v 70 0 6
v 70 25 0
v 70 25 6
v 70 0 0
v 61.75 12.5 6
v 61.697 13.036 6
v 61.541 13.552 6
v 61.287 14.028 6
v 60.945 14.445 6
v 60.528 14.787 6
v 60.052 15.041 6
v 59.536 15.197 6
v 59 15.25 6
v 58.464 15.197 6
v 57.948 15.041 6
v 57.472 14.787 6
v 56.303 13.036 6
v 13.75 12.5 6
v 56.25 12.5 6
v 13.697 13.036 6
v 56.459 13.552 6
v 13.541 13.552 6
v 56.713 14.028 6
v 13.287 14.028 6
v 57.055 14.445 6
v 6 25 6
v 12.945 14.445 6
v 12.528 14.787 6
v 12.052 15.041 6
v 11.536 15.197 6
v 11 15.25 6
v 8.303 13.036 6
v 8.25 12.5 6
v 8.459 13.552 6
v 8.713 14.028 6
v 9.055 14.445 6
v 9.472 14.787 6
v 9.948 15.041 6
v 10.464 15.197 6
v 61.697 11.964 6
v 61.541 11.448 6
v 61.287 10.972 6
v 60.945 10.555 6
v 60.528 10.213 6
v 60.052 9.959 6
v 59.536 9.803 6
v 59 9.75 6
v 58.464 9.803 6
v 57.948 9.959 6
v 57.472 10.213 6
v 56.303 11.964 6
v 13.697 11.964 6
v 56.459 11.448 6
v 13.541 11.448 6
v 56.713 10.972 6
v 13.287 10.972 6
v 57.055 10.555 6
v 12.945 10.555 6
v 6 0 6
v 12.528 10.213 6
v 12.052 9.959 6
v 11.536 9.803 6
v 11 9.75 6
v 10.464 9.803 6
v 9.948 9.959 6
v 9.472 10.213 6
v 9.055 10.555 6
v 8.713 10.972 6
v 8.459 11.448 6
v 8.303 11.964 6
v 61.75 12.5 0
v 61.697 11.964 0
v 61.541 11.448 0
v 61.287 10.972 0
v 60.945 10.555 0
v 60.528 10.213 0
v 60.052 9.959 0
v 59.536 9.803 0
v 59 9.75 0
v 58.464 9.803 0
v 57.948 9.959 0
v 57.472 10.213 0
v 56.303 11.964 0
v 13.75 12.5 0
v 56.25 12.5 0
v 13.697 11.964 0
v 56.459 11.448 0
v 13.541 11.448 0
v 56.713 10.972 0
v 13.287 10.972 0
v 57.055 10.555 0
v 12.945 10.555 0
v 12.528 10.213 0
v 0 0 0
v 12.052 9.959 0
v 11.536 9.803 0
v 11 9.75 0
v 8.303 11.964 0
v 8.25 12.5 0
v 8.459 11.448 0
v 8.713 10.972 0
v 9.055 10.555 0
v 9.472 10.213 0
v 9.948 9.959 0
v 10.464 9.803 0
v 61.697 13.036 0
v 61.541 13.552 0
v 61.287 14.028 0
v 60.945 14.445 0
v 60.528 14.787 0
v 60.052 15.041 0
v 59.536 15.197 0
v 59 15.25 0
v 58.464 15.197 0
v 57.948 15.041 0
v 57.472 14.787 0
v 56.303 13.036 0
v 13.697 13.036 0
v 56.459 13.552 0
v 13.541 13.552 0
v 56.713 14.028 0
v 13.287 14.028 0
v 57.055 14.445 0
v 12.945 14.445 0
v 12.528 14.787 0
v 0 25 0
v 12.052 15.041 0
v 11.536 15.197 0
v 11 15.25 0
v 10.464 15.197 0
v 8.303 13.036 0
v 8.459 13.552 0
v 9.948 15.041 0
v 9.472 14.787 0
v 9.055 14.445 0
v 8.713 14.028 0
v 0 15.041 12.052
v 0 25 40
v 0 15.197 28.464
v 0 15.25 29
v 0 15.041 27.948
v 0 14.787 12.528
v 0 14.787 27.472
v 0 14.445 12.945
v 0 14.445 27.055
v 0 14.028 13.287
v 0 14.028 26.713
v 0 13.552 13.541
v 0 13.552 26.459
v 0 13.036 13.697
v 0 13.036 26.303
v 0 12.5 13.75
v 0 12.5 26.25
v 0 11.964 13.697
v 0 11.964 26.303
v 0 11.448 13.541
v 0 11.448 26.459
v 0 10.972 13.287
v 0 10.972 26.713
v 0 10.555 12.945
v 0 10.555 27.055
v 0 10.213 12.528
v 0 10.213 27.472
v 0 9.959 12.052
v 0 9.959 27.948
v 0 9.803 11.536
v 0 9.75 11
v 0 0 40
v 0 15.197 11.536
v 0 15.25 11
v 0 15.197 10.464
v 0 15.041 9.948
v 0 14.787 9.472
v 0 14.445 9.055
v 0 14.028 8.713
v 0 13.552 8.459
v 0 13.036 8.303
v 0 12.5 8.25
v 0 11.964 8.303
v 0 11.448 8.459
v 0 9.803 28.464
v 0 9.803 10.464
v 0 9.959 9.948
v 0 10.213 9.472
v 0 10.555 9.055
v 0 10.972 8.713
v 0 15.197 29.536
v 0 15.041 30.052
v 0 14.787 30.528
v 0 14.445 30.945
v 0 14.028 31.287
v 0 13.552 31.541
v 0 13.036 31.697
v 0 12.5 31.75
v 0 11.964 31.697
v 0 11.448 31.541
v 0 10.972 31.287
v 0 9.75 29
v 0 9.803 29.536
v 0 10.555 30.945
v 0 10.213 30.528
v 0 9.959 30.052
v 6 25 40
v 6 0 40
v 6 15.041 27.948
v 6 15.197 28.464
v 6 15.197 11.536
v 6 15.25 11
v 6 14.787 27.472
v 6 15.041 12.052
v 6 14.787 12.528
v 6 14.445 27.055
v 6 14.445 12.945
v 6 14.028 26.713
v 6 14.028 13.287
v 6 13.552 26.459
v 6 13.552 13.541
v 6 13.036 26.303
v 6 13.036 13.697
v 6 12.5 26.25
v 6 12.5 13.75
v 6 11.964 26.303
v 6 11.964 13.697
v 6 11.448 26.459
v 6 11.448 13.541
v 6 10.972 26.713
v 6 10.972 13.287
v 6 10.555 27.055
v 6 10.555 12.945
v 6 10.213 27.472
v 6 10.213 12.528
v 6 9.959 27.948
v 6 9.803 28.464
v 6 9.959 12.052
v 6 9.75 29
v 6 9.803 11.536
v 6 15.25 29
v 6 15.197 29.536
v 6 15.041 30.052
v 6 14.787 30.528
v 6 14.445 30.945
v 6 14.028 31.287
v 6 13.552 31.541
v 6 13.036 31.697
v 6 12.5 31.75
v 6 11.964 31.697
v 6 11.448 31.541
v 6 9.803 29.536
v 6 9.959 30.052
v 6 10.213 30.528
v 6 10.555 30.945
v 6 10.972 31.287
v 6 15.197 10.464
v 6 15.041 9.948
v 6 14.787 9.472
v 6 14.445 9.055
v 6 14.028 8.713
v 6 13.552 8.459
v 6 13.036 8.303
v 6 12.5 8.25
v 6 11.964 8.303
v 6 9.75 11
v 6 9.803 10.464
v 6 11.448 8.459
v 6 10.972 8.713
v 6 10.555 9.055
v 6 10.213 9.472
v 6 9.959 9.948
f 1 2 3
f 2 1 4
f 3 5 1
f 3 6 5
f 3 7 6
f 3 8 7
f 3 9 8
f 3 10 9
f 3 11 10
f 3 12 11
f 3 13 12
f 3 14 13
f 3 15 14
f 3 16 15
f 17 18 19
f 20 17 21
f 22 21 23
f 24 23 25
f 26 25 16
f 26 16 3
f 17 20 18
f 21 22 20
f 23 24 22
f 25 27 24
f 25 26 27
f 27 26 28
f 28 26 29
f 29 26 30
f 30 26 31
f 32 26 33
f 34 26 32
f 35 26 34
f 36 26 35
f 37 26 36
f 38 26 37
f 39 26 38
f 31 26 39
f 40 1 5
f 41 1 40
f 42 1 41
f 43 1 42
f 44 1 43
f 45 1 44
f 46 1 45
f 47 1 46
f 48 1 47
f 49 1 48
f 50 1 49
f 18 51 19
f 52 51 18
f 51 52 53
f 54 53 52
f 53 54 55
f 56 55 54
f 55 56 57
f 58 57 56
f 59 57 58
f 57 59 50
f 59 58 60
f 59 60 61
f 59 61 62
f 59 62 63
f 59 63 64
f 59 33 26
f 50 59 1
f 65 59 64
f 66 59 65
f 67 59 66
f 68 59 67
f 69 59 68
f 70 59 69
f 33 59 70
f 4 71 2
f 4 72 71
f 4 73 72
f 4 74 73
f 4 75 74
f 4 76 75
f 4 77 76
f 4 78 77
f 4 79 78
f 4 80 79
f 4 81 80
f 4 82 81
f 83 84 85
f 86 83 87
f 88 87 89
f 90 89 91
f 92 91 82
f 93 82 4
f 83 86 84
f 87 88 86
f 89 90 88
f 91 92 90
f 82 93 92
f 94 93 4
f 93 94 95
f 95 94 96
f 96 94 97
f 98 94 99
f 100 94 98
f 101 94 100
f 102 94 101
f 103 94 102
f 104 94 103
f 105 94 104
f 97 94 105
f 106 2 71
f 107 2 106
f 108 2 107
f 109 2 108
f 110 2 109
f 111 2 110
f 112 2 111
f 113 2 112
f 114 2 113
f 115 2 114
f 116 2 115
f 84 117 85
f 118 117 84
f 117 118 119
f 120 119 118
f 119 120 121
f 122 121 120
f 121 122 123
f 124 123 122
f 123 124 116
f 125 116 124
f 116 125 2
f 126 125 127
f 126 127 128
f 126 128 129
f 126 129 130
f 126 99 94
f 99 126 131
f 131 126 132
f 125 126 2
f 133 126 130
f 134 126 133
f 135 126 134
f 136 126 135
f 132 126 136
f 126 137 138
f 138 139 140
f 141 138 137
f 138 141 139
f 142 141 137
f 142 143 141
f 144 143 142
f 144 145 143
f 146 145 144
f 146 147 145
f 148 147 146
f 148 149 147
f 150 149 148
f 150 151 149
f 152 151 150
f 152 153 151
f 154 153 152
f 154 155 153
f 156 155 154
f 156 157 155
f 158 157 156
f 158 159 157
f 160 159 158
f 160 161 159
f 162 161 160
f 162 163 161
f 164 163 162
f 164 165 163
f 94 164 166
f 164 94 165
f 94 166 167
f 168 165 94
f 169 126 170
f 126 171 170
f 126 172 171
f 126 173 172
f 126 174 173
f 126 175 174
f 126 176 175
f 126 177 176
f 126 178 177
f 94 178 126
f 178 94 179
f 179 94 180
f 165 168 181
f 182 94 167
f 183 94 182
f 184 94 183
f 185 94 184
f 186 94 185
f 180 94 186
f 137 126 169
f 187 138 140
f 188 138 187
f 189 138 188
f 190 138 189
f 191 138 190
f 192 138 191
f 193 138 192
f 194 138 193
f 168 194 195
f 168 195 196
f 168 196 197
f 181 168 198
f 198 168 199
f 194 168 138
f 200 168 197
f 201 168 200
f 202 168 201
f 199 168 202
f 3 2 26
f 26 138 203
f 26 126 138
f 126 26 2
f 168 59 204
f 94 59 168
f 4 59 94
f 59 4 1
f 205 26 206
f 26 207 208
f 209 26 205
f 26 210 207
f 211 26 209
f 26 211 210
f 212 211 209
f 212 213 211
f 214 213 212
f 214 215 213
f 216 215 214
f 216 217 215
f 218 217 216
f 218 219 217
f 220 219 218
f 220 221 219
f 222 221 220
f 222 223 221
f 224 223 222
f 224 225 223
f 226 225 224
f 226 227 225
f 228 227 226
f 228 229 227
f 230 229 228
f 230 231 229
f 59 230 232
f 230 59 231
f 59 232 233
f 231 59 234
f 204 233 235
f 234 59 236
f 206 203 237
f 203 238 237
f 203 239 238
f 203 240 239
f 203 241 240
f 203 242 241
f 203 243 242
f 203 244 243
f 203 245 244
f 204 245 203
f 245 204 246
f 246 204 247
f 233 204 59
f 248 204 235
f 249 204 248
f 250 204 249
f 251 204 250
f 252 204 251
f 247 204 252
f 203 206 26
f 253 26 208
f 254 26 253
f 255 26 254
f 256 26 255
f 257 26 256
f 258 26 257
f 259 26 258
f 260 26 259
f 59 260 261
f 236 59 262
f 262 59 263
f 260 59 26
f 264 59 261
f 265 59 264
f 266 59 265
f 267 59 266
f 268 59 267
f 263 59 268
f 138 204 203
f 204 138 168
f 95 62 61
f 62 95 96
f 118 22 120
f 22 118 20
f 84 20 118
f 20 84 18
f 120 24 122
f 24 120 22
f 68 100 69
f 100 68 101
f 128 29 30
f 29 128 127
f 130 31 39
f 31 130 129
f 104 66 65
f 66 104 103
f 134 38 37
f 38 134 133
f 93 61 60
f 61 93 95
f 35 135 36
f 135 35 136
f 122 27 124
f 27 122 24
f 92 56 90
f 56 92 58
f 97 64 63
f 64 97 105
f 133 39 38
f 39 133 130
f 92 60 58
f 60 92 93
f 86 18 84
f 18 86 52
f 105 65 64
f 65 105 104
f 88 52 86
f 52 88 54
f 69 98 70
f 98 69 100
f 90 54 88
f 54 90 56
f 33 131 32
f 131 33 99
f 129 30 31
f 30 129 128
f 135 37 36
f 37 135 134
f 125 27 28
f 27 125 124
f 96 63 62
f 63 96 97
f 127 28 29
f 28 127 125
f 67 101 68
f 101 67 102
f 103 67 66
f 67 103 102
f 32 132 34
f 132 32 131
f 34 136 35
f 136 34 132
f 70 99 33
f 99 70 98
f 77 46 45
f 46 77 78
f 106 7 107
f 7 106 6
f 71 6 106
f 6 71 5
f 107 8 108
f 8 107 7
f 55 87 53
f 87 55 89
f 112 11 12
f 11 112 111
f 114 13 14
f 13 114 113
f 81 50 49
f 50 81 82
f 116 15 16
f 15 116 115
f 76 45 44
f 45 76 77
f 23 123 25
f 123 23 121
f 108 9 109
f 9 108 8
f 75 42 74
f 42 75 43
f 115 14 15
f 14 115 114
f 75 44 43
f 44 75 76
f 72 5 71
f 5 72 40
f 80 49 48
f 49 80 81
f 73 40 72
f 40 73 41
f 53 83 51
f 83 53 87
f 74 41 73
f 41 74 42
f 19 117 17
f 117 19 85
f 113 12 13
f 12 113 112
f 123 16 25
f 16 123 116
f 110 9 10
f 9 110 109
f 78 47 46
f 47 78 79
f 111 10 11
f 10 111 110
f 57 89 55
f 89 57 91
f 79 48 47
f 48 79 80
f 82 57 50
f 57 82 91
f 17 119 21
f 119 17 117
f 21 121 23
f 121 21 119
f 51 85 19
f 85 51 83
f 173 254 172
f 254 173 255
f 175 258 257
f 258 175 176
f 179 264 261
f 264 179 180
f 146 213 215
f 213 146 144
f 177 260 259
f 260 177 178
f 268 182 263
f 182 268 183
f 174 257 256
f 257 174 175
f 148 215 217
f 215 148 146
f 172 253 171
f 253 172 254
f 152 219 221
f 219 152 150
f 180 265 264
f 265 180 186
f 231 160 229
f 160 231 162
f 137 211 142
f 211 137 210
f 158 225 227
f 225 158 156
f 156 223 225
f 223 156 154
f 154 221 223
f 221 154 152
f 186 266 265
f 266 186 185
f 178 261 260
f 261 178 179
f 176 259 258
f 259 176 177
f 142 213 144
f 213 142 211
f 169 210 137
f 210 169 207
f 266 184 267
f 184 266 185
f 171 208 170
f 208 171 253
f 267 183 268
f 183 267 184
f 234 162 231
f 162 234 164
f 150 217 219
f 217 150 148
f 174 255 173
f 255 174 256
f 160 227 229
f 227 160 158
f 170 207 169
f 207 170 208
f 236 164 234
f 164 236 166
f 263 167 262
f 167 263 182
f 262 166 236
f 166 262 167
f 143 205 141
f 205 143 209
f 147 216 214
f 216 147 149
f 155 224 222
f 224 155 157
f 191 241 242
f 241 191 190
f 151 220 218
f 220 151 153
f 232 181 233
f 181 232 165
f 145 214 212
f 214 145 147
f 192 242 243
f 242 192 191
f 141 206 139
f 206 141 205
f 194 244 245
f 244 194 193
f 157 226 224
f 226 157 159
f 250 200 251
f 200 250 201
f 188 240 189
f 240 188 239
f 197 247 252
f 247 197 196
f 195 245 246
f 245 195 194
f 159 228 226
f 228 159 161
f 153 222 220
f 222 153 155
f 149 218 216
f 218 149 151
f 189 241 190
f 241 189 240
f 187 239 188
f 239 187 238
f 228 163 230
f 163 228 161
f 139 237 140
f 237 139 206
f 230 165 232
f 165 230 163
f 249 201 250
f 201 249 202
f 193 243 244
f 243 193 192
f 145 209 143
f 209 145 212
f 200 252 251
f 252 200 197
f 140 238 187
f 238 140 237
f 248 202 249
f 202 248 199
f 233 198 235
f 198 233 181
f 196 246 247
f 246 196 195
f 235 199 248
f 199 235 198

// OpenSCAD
$fn = 32;

// ----------------------------------------------------------------------
// L-bracket: 70 x 25 x 40 mm
// ----------------------------------------------------------------------

// --- parameters (mm) ---
leg_a = 70;               // horizontal leg, X
leg_b = 40;               // vertical leg, Z
depth = 25;               // bracket depth, Y
thick = 6;                // plate thickness
hole_d = 5.5;             // clearance for M5

module hole_z(px, py) {
  translate([px, py, -2.5]) cylinder(h = thick + 5, d = hole_d);
}
module hole_x(pz, py) {
  translate([-2.5, py, pz]) rotate([0, 90, 0]) cylinder(h = thick + 5, d = hole_d);
}

difference() {
  union() {
    /* horizontal leg */
    cube([leg_a, depth, thick]);
    /* vertical leg, overlapping the corner block */
    cube([thick, depth, leg_b]);
  }
  hole_z(11, 12.5);
  hole_z(59, 12.5);
  hole_x(11, 12.5);
  hole_x(29, 12.5);
}
